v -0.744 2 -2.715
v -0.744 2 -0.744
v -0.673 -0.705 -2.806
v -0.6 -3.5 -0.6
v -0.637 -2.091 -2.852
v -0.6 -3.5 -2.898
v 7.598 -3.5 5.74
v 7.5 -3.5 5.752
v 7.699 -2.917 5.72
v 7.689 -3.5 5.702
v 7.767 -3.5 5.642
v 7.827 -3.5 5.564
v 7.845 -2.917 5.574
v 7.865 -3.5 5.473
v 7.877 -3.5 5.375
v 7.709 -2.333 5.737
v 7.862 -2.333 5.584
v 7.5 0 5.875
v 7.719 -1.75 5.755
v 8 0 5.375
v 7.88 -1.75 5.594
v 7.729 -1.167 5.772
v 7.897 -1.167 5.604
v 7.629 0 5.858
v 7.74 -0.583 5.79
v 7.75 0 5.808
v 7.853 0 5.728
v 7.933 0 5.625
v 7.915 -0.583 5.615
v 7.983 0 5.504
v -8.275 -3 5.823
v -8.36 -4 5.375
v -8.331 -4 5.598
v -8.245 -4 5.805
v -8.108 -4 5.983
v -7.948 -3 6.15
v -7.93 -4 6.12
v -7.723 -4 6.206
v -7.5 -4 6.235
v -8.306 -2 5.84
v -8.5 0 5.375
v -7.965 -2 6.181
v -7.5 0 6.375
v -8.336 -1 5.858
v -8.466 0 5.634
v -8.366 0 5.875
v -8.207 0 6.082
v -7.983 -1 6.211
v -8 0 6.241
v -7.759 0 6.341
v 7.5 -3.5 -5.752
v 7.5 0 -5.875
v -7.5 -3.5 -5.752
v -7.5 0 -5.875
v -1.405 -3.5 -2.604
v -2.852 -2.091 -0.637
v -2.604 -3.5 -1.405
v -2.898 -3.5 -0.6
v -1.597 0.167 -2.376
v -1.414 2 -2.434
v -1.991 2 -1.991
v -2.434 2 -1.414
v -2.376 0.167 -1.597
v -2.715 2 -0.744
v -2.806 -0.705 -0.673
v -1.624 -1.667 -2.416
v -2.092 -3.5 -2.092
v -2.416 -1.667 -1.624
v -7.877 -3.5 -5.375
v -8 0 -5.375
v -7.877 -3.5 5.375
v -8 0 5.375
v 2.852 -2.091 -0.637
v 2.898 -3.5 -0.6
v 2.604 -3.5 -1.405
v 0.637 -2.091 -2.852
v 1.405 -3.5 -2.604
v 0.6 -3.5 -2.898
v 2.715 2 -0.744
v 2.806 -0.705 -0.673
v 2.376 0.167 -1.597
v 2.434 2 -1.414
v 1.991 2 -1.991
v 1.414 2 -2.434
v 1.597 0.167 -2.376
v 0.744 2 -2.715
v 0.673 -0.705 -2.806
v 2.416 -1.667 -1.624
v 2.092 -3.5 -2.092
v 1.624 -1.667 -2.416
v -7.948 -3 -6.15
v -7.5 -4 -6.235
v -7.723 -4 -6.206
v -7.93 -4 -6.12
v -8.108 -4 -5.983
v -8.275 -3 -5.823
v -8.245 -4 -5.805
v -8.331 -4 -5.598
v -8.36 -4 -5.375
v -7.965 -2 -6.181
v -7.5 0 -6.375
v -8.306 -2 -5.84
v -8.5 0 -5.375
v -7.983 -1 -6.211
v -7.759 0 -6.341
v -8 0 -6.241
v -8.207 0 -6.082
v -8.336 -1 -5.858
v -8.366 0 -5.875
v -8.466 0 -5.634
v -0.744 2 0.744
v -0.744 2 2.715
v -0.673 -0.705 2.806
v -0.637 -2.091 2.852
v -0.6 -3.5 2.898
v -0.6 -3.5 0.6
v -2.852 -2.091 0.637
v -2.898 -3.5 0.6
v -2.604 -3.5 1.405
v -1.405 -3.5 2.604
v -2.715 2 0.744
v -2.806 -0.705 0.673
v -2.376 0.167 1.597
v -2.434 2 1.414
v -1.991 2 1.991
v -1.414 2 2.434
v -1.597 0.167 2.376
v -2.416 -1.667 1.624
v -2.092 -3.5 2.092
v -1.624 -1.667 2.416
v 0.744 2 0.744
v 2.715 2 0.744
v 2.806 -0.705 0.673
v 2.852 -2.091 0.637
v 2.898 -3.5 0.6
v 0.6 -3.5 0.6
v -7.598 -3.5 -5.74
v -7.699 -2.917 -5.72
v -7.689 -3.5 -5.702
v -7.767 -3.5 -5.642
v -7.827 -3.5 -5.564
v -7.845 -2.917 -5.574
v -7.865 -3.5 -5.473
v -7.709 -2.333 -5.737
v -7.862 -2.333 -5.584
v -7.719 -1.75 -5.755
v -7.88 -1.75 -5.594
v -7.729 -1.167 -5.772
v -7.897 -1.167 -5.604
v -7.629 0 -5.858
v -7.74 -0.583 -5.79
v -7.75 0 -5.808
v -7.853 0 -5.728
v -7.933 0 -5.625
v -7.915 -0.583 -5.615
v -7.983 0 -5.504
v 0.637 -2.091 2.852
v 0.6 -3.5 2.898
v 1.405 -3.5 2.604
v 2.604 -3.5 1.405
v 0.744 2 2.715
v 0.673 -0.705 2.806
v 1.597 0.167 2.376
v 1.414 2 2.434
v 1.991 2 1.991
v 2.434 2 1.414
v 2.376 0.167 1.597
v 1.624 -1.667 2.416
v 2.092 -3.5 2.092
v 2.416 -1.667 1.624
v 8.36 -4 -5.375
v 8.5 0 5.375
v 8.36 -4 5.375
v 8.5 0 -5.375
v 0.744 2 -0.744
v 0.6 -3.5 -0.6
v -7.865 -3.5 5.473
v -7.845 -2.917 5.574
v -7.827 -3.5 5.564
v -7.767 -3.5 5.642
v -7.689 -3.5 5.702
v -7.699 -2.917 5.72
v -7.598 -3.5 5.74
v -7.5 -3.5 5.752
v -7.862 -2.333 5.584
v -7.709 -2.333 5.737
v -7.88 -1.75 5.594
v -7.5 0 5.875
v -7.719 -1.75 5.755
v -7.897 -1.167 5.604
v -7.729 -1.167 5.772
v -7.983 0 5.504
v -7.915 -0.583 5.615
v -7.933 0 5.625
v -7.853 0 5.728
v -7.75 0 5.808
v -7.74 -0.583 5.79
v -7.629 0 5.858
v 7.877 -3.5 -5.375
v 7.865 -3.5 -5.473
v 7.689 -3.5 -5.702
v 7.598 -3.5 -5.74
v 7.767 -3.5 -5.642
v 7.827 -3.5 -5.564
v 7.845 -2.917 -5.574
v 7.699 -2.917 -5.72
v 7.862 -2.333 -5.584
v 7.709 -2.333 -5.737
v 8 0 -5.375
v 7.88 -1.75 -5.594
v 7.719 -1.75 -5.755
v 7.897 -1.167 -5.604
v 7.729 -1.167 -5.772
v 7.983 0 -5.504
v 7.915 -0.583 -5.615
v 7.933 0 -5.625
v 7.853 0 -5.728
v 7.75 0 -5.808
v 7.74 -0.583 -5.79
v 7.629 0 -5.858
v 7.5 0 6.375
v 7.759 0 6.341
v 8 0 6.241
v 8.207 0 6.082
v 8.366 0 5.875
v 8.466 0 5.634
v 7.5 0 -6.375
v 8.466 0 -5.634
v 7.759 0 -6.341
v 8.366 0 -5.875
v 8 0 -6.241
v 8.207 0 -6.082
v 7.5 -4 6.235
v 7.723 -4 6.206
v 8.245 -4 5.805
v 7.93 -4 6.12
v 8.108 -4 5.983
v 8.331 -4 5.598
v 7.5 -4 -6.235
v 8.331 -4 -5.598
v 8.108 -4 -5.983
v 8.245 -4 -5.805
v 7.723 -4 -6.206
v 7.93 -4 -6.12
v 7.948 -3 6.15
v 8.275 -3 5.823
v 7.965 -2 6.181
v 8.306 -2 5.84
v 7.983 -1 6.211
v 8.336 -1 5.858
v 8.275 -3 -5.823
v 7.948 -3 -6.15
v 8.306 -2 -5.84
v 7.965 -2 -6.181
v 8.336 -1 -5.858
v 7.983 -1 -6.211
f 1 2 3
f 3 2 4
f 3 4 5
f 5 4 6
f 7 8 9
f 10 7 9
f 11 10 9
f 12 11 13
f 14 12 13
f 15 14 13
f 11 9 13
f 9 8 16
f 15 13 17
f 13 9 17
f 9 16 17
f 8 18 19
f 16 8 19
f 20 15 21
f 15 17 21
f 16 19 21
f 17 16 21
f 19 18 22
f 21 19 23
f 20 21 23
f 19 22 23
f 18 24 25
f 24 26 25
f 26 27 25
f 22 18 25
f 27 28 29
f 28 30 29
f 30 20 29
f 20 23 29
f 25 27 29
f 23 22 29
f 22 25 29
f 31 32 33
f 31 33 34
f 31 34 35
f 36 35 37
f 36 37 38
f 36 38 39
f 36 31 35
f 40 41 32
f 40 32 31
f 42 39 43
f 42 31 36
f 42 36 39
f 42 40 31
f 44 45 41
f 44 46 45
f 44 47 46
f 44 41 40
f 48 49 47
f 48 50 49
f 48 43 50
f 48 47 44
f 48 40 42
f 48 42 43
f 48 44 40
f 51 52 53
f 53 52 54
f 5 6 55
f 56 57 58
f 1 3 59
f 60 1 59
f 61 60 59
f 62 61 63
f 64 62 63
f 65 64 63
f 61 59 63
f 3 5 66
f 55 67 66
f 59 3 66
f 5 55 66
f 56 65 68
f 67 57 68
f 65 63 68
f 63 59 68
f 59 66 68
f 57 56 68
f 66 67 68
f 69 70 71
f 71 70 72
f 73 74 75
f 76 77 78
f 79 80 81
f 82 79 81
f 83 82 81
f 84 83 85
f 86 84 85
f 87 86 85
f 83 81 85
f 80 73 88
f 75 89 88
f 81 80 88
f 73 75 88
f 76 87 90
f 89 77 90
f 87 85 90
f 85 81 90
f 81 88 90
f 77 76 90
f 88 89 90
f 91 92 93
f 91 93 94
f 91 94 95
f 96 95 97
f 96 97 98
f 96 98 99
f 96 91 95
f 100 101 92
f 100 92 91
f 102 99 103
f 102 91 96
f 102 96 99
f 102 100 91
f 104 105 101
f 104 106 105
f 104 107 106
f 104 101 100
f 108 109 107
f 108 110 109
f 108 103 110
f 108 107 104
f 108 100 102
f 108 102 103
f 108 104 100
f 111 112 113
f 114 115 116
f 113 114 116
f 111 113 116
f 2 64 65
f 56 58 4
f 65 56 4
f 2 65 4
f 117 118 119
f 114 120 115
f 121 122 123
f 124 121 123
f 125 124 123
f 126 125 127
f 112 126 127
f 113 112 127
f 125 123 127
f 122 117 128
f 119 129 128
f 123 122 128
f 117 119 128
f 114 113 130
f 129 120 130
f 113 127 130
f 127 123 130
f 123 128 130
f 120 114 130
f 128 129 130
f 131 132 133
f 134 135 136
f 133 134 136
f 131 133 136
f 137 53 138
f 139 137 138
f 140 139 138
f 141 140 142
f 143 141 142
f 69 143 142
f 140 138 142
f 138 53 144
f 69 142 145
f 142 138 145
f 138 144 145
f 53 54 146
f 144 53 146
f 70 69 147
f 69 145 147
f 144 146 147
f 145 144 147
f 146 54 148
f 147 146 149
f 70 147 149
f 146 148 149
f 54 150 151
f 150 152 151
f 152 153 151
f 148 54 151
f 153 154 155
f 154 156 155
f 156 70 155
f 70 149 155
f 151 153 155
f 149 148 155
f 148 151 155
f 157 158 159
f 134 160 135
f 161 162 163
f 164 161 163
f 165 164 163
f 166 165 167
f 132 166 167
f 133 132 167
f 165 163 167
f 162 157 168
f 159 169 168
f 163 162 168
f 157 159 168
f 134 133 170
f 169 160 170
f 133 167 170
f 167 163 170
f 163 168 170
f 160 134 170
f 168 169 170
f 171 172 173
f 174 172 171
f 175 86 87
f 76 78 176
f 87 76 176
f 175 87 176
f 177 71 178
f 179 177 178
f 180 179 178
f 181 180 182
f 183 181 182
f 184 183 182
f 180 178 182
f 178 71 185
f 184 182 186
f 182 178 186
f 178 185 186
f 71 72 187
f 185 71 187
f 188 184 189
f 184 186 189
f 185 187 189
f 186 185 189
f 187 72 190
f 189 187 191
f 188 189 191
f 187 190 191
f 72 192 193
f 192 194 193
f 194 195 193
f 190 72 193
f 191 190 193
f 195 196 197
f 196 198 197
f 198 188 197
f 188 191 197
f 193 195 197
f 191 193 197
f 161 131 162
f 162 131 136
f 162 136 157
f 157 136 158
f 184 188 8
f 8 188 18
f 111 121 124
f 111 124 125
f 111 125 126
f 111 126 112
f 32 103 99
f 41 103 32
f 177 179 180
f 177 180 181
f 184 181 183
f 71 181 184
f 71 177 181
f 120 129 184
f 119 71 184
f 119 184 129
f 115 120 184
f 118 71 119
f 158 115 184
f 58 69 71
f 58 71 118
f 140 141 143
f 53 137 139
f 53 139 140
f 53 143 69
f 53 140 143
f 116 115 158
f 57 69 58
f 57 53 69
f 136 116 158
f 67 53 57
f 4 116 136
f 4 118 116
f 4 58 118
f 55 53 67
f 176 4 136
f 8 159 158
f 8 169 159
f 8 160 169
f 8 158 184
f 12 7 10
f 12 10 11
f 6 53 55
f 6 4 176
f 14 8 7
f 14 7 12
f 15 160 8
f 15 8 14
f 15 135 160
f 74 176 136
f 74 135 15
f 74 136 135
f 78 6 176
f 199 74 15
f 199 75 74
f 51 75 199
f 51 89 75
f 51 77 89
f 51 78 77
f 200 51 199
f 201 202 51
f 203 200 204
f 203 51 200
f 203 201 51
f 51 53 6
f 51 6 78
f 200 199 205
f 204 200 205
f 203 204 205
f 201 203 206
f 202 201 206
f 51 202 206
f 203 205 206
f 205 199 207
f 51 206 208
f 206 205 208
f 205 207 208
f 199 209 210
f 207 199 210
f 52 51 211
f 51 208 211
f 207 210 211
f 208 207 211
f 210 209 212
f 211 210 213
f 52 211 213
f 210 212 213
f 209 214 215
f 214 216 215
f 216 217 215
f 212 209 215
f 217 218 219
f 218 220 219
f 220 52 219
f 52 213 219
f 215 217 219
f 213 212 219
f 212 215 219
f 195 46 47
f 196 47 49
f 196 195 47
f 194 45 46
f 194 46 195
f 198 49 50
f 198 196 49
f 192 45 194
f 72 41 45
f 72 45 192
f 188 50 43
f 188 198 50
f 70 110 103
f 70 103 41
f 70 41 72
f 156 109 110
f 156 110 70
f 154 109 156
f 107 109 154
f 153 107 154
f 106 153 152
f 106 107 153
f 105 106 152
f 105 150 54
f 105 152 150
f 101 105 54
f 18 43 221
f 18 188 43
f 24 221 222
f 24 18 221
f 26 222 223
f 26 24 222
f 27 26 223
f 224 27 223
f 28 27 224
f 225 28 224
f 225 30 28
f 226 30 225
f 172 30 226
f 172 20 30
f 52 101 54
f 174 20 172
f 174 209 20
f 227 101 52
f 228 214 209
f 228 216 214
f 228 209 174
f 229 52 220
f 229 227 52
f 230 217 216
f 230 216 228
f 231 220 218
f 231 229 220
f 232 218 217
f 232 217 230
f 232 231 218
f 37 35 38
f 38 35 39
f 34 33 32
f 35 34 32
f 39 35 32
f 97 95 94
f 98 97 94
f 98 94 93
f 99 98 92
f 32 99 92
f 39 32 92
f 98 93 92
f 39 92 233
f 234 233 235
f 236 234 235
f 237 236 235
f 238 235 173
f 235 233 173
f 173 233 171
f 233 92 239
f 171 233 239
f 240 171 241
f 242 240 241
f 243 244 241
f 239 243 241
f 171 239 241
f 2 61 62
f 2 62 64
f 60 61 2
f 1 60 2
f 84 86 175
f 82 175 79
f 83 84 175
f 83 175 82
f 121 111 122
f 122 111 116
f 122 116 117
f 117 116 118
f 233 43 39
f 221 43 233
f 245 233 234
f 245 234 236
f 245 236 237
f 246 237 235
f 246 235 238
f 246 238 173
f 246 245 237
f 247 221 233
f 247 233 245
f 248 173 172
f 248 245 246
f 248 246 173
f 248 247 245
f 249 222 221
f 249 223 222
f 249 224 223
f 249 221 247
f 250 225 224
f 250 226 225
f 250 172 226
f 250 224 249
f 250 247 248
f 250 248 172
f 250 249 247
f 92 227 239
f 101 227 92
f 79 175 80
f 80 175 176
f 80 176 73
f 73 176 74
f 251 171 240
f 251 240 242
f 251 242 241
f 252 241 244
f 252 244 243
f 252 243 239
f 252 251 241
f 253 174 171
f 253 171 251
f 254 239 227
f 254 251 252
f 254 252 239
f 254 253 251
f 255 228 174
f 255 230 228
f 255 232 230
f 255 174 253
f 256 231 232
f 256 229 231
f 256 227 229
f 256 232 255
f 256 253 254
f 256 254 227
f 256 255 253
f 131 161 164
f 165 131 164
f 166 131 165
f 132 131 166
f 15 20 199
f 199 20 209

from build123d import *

# Parameters (mm, degrees)
BOSS_EXTRUDE1_DEPTH           = 4
BOSS_EXTRUDE1_DRAFT           = -2
SHELL1_T                      = -0.5
BOSS_EXTRUDE2_DEPTH           = 5.5
BOSS_EXTRUDE2_DRAFT           = 1.5
BOSS_EXTRUDE2_PROFILE_2_DEPTH = 5.5
BOSS_EXTRUDE2_PROFILE_2_DRAFT = 1.5
BOSS_EXTRUDE2_PROFILE_3_DEPTH = 5.5
BOSS_EXTRUDE2_PROFILE_3_DRAFT = 1.5
BOSS_EXTRUDE2_PROFILE_4_DEPTH = 5.5
BOSS_EXTRUDE2_PROFILE_4_DRAFT = 1.5


with BuildPart() as part:
    # Sketch1 → Boss-Extrude1 (with draft: the straight prism first)
    with BuildSketch(Plane(origin=(0, 0, 0), x_dir=(1, 0, 0), z_dir=(0, 1, 0))):
        with BuildLine():
            Line((-7.5, -6.375), (7.5, -6.375))
            ThreePointArc((7.5, -6.375), (8.207106781, -6.082106781), (8.5, -5.375))
            Line((8.5, -5.375), (8.5, 5.375))
            ThreePointArc((8.5, 5.375), (8.207106781, 6.082106781), (7.5, 6.375))
            Line((7.5, 6.375), (-7.5, 6.375))
            ThreePointArc((-7.5, 6.375), (-8.207106781, 6.082106781), (-8.5, 5.375))
            Line((-8.5, 5.375), (-8.5, -5.375))
            ThreePointArc((-8.5, -5.375), (-8.207106781, -6.082106781), (-7.5, -6.375))
        make_face()
    extrude(amount=-BOSS_EXTRUDE1_DEPTH)
    # Boss-Extrude1: the draft: its side faces are tilted about the plane it starts from
    boss_extrude1_sides = [part.faces().sort_by_distance(p)[0] for p in [
        (0, -2, 6.375),
        (8.207106781, -2, 6.082106781),
        (8.5, -2, 0),
        (8.207106781, -2, -6.082106781),
        (0, -2, -6.375),
        (-8.207106781, -2, -6.082106781),
        (-8.5, -2, 0),
        (-8.207106781, -2, 6.082106781),
    ]]
    draft(boss_extrude1_sides, Plane(origin=(0, 0, 0), x_dir=(1, 0, 0), z_dir=(0, 1, 0)), BOSS_EXTRUDE1_DRAFT)

    # Shell1
    shell1_openings = [part.faces().sort_by_distance(p)[0] for p in [
        (0, 0, 0),
    ]]
    offset(amount=SHELL1_T, openings=shell1_openings, kind=Kind.INTERSECTION)


with BuildPart() as boss_extrude2_tool:
    # Sketch3 → Boss-Extrude2 (with draft: the straight prism first)
    with BuildSketch(Plane(origin=(0, -3.5, 0), x_dir=(1, 0, 0), z_dir=(0, 1, 0))):
        with BuildLine():
            ThreePointArc((-0.6, 2.897704648), (-2.092449787, 2.092449787), (-2.897704648, 0.6))
            Line((-2.897704648, 0.6), (-0.6, 0.6))
            Line((-0.6, 0.6), (-0.6, 2.897704648))
        make_face()
    extrude(amount=BOSS_EXTRUDE2_DEPTH)
    # Boss-Extrude2: the draft: its side faces are tilted about the plane it starts from
    boss_extrude2_sides = [boss_extrude2_tool.faces().sort_by_distance(p)[0] for p in [
        (-2.092449787, -0.75, -2.092449787),
        (-1.748852324, -0.75, -0.6),
        (-0.6, -0.75, -1.748852324),
    ]]
    draft(boss_extrude2_sides, Plane(origin=(0, -3.5, 0), x_dir=(1, 0, 0), z_dir=(0, 1, 0)), BOSS_EXTRUDE2_DRAFT)


with BuildPart() as part_1:
    add(part.part)

    # Boss-Extrude2: add boss_extrude2_tool
    add(boss_extrude2_tool.part)


with BuildPart() as boss_extrude2_profile_2_tool:
    # Sketch3 → Boss-Extrude2 profile 2 (with draft: the straight prism first)
    with BuildSketch(Plane(origin=(0, -3.5, 0), x_dir=(1, 0, 0), z_dir=(0, 1, 0))):
        with BuildLine():
            Line((0.6, 2.897704648), (0.6, 0.6))
            Line((0.6, 0.6), (2.897704648, 0.6))
            ThreePointArc((2.897704648, 0.6), (2.092449787, 2.092449787), (0.6, 2.897704648))
        make_face()
    extrude(amount=BOSS_EXTRUDE2_PROFILE_2_DEPTH)
    # Boss-Extrude2 profile 2: the draft: its side faces are tilted about the plane it starts from
    boss_extrude2_profile_2_sides = [boss_extrude2_profile_2_tool.faces().sort_by_distance(p)[0] for p in [
        (2.092449787, -0.75, -2.092449787),
        (0.6, -0.75, -1.748852324),
        (1.748852324, -0.75, -0.6),
    ]]
    draft(boss_extrude2_profile_2_sides, Plane(origin=(0, -3.5, 0), x_dir=(1, 0, 0), z_dir=(0, 1, 0)), BOSS_EXTRUDE2_PROFILE_2_DRAFT)


with BuildPart() as part_2:
    add(part_1.part)

    # Boss-Extrude2 profile 2: add boss_extrude2_profile_2_tool
    add(boss_extrude2_profile_2_tool.part)


with BuildPart() as boss_extrude2_profile_3_tool:
    # Sketch3 → Boss-Extrude2 profile 3 (with draft: the straight prism first)
    with BuildSketch(Plane(origin=(0, -3.5, 0), x_dir=(1, 0, 0), z_dir=(0, 1, 0))):
        with BuildLine():
            ThreePointArc((-2.897704648, -0.6), (-2.092449787, -2.092449787), (-0.6, -2.897704648))
            Line((-0.6, -2.897704648), (-0.6, -0.6))
            Line((-0.6, -0.6), (-2.897704648, -0.6))
        make_face()
    extrude(amount=BOSS_EXTRUDE2_PROFILE_3_DEPTH)
    # Boss-Extrude2 profile 3: the draft: its side faces are tilted about the plane it starts from
    boss_extrude2_profile_3_sides = [boss_extrude2_profile_3_tool.faces().sort_by_distance(p)[0] for p in [
        (-2.092449787, -0.75, 2.092449787),
        (-0.6, -0.75, 1.748852324),
        (-1.748852324, -0.75, 0.6),
    ]]
    draft(boss_extrude2_profile_3_sides, Plane(origin=(0, -3.5, 0), x_dir=(1, 0, 0), z_dir=(0, 1, 0)), BOSS_EXTRUDE2_PROFILE_3_DRAFT)


with BuildPart() as part_3:
    add(part_2.part)

    # Boss-Extrude2 profile 3: add boss_extrude2_profile_3_tool
    add(boss_extrude2_profile_3_tool.part)


with BuildPart() as boss_extrude2_profile_4_tool:
    # Sketch3 → Boss-Extrude2 profile 4 (with draft: the straight prism first)
    with BuildSketch(Plane(origin=(0, -3.5, 0), x_dir=(1, 0, 0), z_dir=(0, 1, 0))):
        with BuildLine():
            Line((0.6, -0.6), (0.6, -2.897704648))
            ThreePointArc((0.6, -2.897704648), (2.092449787, -2.092449787), (2.897704648, -0.6))
            Line((2.897704648, -0.6), (0.6, -0.6))
        make_face()
    extrude(amount=BOSS_EXTRUDE2_PROFILE_4_DEPTH)
    # Boss-Extrude2 profile 4: the draft: its side faces are tilted about the plane it starts from
    boss_extrude2_profile_4_sides = [boss_extrude2_profile_4_tool.faces().sort_by_distance(p)[0] for p in [
        (1.748852324, -0.75, 0.6),
        (0.6, -0.75, 1.748852324),
        (2.092449787, -0.75, 2.092449787),
    ]]
    draft(boss_extrude2_profile_4_sides, Plane(origin=(0, -3.5, 0), x_dir=(1, 0, 0), z_dir=(0, 1, 0)), BOSS_EXTRUDE2_PROFILE_4_DRAFT)


with BuildPart() as part_4:
    add(part_3.part)

    # Boss-Extrude2 profile 4: add boss_extrude2_profile_4_tool
    add(boss_extrude2_profile_4_tool.part)


solid = part_4.part
